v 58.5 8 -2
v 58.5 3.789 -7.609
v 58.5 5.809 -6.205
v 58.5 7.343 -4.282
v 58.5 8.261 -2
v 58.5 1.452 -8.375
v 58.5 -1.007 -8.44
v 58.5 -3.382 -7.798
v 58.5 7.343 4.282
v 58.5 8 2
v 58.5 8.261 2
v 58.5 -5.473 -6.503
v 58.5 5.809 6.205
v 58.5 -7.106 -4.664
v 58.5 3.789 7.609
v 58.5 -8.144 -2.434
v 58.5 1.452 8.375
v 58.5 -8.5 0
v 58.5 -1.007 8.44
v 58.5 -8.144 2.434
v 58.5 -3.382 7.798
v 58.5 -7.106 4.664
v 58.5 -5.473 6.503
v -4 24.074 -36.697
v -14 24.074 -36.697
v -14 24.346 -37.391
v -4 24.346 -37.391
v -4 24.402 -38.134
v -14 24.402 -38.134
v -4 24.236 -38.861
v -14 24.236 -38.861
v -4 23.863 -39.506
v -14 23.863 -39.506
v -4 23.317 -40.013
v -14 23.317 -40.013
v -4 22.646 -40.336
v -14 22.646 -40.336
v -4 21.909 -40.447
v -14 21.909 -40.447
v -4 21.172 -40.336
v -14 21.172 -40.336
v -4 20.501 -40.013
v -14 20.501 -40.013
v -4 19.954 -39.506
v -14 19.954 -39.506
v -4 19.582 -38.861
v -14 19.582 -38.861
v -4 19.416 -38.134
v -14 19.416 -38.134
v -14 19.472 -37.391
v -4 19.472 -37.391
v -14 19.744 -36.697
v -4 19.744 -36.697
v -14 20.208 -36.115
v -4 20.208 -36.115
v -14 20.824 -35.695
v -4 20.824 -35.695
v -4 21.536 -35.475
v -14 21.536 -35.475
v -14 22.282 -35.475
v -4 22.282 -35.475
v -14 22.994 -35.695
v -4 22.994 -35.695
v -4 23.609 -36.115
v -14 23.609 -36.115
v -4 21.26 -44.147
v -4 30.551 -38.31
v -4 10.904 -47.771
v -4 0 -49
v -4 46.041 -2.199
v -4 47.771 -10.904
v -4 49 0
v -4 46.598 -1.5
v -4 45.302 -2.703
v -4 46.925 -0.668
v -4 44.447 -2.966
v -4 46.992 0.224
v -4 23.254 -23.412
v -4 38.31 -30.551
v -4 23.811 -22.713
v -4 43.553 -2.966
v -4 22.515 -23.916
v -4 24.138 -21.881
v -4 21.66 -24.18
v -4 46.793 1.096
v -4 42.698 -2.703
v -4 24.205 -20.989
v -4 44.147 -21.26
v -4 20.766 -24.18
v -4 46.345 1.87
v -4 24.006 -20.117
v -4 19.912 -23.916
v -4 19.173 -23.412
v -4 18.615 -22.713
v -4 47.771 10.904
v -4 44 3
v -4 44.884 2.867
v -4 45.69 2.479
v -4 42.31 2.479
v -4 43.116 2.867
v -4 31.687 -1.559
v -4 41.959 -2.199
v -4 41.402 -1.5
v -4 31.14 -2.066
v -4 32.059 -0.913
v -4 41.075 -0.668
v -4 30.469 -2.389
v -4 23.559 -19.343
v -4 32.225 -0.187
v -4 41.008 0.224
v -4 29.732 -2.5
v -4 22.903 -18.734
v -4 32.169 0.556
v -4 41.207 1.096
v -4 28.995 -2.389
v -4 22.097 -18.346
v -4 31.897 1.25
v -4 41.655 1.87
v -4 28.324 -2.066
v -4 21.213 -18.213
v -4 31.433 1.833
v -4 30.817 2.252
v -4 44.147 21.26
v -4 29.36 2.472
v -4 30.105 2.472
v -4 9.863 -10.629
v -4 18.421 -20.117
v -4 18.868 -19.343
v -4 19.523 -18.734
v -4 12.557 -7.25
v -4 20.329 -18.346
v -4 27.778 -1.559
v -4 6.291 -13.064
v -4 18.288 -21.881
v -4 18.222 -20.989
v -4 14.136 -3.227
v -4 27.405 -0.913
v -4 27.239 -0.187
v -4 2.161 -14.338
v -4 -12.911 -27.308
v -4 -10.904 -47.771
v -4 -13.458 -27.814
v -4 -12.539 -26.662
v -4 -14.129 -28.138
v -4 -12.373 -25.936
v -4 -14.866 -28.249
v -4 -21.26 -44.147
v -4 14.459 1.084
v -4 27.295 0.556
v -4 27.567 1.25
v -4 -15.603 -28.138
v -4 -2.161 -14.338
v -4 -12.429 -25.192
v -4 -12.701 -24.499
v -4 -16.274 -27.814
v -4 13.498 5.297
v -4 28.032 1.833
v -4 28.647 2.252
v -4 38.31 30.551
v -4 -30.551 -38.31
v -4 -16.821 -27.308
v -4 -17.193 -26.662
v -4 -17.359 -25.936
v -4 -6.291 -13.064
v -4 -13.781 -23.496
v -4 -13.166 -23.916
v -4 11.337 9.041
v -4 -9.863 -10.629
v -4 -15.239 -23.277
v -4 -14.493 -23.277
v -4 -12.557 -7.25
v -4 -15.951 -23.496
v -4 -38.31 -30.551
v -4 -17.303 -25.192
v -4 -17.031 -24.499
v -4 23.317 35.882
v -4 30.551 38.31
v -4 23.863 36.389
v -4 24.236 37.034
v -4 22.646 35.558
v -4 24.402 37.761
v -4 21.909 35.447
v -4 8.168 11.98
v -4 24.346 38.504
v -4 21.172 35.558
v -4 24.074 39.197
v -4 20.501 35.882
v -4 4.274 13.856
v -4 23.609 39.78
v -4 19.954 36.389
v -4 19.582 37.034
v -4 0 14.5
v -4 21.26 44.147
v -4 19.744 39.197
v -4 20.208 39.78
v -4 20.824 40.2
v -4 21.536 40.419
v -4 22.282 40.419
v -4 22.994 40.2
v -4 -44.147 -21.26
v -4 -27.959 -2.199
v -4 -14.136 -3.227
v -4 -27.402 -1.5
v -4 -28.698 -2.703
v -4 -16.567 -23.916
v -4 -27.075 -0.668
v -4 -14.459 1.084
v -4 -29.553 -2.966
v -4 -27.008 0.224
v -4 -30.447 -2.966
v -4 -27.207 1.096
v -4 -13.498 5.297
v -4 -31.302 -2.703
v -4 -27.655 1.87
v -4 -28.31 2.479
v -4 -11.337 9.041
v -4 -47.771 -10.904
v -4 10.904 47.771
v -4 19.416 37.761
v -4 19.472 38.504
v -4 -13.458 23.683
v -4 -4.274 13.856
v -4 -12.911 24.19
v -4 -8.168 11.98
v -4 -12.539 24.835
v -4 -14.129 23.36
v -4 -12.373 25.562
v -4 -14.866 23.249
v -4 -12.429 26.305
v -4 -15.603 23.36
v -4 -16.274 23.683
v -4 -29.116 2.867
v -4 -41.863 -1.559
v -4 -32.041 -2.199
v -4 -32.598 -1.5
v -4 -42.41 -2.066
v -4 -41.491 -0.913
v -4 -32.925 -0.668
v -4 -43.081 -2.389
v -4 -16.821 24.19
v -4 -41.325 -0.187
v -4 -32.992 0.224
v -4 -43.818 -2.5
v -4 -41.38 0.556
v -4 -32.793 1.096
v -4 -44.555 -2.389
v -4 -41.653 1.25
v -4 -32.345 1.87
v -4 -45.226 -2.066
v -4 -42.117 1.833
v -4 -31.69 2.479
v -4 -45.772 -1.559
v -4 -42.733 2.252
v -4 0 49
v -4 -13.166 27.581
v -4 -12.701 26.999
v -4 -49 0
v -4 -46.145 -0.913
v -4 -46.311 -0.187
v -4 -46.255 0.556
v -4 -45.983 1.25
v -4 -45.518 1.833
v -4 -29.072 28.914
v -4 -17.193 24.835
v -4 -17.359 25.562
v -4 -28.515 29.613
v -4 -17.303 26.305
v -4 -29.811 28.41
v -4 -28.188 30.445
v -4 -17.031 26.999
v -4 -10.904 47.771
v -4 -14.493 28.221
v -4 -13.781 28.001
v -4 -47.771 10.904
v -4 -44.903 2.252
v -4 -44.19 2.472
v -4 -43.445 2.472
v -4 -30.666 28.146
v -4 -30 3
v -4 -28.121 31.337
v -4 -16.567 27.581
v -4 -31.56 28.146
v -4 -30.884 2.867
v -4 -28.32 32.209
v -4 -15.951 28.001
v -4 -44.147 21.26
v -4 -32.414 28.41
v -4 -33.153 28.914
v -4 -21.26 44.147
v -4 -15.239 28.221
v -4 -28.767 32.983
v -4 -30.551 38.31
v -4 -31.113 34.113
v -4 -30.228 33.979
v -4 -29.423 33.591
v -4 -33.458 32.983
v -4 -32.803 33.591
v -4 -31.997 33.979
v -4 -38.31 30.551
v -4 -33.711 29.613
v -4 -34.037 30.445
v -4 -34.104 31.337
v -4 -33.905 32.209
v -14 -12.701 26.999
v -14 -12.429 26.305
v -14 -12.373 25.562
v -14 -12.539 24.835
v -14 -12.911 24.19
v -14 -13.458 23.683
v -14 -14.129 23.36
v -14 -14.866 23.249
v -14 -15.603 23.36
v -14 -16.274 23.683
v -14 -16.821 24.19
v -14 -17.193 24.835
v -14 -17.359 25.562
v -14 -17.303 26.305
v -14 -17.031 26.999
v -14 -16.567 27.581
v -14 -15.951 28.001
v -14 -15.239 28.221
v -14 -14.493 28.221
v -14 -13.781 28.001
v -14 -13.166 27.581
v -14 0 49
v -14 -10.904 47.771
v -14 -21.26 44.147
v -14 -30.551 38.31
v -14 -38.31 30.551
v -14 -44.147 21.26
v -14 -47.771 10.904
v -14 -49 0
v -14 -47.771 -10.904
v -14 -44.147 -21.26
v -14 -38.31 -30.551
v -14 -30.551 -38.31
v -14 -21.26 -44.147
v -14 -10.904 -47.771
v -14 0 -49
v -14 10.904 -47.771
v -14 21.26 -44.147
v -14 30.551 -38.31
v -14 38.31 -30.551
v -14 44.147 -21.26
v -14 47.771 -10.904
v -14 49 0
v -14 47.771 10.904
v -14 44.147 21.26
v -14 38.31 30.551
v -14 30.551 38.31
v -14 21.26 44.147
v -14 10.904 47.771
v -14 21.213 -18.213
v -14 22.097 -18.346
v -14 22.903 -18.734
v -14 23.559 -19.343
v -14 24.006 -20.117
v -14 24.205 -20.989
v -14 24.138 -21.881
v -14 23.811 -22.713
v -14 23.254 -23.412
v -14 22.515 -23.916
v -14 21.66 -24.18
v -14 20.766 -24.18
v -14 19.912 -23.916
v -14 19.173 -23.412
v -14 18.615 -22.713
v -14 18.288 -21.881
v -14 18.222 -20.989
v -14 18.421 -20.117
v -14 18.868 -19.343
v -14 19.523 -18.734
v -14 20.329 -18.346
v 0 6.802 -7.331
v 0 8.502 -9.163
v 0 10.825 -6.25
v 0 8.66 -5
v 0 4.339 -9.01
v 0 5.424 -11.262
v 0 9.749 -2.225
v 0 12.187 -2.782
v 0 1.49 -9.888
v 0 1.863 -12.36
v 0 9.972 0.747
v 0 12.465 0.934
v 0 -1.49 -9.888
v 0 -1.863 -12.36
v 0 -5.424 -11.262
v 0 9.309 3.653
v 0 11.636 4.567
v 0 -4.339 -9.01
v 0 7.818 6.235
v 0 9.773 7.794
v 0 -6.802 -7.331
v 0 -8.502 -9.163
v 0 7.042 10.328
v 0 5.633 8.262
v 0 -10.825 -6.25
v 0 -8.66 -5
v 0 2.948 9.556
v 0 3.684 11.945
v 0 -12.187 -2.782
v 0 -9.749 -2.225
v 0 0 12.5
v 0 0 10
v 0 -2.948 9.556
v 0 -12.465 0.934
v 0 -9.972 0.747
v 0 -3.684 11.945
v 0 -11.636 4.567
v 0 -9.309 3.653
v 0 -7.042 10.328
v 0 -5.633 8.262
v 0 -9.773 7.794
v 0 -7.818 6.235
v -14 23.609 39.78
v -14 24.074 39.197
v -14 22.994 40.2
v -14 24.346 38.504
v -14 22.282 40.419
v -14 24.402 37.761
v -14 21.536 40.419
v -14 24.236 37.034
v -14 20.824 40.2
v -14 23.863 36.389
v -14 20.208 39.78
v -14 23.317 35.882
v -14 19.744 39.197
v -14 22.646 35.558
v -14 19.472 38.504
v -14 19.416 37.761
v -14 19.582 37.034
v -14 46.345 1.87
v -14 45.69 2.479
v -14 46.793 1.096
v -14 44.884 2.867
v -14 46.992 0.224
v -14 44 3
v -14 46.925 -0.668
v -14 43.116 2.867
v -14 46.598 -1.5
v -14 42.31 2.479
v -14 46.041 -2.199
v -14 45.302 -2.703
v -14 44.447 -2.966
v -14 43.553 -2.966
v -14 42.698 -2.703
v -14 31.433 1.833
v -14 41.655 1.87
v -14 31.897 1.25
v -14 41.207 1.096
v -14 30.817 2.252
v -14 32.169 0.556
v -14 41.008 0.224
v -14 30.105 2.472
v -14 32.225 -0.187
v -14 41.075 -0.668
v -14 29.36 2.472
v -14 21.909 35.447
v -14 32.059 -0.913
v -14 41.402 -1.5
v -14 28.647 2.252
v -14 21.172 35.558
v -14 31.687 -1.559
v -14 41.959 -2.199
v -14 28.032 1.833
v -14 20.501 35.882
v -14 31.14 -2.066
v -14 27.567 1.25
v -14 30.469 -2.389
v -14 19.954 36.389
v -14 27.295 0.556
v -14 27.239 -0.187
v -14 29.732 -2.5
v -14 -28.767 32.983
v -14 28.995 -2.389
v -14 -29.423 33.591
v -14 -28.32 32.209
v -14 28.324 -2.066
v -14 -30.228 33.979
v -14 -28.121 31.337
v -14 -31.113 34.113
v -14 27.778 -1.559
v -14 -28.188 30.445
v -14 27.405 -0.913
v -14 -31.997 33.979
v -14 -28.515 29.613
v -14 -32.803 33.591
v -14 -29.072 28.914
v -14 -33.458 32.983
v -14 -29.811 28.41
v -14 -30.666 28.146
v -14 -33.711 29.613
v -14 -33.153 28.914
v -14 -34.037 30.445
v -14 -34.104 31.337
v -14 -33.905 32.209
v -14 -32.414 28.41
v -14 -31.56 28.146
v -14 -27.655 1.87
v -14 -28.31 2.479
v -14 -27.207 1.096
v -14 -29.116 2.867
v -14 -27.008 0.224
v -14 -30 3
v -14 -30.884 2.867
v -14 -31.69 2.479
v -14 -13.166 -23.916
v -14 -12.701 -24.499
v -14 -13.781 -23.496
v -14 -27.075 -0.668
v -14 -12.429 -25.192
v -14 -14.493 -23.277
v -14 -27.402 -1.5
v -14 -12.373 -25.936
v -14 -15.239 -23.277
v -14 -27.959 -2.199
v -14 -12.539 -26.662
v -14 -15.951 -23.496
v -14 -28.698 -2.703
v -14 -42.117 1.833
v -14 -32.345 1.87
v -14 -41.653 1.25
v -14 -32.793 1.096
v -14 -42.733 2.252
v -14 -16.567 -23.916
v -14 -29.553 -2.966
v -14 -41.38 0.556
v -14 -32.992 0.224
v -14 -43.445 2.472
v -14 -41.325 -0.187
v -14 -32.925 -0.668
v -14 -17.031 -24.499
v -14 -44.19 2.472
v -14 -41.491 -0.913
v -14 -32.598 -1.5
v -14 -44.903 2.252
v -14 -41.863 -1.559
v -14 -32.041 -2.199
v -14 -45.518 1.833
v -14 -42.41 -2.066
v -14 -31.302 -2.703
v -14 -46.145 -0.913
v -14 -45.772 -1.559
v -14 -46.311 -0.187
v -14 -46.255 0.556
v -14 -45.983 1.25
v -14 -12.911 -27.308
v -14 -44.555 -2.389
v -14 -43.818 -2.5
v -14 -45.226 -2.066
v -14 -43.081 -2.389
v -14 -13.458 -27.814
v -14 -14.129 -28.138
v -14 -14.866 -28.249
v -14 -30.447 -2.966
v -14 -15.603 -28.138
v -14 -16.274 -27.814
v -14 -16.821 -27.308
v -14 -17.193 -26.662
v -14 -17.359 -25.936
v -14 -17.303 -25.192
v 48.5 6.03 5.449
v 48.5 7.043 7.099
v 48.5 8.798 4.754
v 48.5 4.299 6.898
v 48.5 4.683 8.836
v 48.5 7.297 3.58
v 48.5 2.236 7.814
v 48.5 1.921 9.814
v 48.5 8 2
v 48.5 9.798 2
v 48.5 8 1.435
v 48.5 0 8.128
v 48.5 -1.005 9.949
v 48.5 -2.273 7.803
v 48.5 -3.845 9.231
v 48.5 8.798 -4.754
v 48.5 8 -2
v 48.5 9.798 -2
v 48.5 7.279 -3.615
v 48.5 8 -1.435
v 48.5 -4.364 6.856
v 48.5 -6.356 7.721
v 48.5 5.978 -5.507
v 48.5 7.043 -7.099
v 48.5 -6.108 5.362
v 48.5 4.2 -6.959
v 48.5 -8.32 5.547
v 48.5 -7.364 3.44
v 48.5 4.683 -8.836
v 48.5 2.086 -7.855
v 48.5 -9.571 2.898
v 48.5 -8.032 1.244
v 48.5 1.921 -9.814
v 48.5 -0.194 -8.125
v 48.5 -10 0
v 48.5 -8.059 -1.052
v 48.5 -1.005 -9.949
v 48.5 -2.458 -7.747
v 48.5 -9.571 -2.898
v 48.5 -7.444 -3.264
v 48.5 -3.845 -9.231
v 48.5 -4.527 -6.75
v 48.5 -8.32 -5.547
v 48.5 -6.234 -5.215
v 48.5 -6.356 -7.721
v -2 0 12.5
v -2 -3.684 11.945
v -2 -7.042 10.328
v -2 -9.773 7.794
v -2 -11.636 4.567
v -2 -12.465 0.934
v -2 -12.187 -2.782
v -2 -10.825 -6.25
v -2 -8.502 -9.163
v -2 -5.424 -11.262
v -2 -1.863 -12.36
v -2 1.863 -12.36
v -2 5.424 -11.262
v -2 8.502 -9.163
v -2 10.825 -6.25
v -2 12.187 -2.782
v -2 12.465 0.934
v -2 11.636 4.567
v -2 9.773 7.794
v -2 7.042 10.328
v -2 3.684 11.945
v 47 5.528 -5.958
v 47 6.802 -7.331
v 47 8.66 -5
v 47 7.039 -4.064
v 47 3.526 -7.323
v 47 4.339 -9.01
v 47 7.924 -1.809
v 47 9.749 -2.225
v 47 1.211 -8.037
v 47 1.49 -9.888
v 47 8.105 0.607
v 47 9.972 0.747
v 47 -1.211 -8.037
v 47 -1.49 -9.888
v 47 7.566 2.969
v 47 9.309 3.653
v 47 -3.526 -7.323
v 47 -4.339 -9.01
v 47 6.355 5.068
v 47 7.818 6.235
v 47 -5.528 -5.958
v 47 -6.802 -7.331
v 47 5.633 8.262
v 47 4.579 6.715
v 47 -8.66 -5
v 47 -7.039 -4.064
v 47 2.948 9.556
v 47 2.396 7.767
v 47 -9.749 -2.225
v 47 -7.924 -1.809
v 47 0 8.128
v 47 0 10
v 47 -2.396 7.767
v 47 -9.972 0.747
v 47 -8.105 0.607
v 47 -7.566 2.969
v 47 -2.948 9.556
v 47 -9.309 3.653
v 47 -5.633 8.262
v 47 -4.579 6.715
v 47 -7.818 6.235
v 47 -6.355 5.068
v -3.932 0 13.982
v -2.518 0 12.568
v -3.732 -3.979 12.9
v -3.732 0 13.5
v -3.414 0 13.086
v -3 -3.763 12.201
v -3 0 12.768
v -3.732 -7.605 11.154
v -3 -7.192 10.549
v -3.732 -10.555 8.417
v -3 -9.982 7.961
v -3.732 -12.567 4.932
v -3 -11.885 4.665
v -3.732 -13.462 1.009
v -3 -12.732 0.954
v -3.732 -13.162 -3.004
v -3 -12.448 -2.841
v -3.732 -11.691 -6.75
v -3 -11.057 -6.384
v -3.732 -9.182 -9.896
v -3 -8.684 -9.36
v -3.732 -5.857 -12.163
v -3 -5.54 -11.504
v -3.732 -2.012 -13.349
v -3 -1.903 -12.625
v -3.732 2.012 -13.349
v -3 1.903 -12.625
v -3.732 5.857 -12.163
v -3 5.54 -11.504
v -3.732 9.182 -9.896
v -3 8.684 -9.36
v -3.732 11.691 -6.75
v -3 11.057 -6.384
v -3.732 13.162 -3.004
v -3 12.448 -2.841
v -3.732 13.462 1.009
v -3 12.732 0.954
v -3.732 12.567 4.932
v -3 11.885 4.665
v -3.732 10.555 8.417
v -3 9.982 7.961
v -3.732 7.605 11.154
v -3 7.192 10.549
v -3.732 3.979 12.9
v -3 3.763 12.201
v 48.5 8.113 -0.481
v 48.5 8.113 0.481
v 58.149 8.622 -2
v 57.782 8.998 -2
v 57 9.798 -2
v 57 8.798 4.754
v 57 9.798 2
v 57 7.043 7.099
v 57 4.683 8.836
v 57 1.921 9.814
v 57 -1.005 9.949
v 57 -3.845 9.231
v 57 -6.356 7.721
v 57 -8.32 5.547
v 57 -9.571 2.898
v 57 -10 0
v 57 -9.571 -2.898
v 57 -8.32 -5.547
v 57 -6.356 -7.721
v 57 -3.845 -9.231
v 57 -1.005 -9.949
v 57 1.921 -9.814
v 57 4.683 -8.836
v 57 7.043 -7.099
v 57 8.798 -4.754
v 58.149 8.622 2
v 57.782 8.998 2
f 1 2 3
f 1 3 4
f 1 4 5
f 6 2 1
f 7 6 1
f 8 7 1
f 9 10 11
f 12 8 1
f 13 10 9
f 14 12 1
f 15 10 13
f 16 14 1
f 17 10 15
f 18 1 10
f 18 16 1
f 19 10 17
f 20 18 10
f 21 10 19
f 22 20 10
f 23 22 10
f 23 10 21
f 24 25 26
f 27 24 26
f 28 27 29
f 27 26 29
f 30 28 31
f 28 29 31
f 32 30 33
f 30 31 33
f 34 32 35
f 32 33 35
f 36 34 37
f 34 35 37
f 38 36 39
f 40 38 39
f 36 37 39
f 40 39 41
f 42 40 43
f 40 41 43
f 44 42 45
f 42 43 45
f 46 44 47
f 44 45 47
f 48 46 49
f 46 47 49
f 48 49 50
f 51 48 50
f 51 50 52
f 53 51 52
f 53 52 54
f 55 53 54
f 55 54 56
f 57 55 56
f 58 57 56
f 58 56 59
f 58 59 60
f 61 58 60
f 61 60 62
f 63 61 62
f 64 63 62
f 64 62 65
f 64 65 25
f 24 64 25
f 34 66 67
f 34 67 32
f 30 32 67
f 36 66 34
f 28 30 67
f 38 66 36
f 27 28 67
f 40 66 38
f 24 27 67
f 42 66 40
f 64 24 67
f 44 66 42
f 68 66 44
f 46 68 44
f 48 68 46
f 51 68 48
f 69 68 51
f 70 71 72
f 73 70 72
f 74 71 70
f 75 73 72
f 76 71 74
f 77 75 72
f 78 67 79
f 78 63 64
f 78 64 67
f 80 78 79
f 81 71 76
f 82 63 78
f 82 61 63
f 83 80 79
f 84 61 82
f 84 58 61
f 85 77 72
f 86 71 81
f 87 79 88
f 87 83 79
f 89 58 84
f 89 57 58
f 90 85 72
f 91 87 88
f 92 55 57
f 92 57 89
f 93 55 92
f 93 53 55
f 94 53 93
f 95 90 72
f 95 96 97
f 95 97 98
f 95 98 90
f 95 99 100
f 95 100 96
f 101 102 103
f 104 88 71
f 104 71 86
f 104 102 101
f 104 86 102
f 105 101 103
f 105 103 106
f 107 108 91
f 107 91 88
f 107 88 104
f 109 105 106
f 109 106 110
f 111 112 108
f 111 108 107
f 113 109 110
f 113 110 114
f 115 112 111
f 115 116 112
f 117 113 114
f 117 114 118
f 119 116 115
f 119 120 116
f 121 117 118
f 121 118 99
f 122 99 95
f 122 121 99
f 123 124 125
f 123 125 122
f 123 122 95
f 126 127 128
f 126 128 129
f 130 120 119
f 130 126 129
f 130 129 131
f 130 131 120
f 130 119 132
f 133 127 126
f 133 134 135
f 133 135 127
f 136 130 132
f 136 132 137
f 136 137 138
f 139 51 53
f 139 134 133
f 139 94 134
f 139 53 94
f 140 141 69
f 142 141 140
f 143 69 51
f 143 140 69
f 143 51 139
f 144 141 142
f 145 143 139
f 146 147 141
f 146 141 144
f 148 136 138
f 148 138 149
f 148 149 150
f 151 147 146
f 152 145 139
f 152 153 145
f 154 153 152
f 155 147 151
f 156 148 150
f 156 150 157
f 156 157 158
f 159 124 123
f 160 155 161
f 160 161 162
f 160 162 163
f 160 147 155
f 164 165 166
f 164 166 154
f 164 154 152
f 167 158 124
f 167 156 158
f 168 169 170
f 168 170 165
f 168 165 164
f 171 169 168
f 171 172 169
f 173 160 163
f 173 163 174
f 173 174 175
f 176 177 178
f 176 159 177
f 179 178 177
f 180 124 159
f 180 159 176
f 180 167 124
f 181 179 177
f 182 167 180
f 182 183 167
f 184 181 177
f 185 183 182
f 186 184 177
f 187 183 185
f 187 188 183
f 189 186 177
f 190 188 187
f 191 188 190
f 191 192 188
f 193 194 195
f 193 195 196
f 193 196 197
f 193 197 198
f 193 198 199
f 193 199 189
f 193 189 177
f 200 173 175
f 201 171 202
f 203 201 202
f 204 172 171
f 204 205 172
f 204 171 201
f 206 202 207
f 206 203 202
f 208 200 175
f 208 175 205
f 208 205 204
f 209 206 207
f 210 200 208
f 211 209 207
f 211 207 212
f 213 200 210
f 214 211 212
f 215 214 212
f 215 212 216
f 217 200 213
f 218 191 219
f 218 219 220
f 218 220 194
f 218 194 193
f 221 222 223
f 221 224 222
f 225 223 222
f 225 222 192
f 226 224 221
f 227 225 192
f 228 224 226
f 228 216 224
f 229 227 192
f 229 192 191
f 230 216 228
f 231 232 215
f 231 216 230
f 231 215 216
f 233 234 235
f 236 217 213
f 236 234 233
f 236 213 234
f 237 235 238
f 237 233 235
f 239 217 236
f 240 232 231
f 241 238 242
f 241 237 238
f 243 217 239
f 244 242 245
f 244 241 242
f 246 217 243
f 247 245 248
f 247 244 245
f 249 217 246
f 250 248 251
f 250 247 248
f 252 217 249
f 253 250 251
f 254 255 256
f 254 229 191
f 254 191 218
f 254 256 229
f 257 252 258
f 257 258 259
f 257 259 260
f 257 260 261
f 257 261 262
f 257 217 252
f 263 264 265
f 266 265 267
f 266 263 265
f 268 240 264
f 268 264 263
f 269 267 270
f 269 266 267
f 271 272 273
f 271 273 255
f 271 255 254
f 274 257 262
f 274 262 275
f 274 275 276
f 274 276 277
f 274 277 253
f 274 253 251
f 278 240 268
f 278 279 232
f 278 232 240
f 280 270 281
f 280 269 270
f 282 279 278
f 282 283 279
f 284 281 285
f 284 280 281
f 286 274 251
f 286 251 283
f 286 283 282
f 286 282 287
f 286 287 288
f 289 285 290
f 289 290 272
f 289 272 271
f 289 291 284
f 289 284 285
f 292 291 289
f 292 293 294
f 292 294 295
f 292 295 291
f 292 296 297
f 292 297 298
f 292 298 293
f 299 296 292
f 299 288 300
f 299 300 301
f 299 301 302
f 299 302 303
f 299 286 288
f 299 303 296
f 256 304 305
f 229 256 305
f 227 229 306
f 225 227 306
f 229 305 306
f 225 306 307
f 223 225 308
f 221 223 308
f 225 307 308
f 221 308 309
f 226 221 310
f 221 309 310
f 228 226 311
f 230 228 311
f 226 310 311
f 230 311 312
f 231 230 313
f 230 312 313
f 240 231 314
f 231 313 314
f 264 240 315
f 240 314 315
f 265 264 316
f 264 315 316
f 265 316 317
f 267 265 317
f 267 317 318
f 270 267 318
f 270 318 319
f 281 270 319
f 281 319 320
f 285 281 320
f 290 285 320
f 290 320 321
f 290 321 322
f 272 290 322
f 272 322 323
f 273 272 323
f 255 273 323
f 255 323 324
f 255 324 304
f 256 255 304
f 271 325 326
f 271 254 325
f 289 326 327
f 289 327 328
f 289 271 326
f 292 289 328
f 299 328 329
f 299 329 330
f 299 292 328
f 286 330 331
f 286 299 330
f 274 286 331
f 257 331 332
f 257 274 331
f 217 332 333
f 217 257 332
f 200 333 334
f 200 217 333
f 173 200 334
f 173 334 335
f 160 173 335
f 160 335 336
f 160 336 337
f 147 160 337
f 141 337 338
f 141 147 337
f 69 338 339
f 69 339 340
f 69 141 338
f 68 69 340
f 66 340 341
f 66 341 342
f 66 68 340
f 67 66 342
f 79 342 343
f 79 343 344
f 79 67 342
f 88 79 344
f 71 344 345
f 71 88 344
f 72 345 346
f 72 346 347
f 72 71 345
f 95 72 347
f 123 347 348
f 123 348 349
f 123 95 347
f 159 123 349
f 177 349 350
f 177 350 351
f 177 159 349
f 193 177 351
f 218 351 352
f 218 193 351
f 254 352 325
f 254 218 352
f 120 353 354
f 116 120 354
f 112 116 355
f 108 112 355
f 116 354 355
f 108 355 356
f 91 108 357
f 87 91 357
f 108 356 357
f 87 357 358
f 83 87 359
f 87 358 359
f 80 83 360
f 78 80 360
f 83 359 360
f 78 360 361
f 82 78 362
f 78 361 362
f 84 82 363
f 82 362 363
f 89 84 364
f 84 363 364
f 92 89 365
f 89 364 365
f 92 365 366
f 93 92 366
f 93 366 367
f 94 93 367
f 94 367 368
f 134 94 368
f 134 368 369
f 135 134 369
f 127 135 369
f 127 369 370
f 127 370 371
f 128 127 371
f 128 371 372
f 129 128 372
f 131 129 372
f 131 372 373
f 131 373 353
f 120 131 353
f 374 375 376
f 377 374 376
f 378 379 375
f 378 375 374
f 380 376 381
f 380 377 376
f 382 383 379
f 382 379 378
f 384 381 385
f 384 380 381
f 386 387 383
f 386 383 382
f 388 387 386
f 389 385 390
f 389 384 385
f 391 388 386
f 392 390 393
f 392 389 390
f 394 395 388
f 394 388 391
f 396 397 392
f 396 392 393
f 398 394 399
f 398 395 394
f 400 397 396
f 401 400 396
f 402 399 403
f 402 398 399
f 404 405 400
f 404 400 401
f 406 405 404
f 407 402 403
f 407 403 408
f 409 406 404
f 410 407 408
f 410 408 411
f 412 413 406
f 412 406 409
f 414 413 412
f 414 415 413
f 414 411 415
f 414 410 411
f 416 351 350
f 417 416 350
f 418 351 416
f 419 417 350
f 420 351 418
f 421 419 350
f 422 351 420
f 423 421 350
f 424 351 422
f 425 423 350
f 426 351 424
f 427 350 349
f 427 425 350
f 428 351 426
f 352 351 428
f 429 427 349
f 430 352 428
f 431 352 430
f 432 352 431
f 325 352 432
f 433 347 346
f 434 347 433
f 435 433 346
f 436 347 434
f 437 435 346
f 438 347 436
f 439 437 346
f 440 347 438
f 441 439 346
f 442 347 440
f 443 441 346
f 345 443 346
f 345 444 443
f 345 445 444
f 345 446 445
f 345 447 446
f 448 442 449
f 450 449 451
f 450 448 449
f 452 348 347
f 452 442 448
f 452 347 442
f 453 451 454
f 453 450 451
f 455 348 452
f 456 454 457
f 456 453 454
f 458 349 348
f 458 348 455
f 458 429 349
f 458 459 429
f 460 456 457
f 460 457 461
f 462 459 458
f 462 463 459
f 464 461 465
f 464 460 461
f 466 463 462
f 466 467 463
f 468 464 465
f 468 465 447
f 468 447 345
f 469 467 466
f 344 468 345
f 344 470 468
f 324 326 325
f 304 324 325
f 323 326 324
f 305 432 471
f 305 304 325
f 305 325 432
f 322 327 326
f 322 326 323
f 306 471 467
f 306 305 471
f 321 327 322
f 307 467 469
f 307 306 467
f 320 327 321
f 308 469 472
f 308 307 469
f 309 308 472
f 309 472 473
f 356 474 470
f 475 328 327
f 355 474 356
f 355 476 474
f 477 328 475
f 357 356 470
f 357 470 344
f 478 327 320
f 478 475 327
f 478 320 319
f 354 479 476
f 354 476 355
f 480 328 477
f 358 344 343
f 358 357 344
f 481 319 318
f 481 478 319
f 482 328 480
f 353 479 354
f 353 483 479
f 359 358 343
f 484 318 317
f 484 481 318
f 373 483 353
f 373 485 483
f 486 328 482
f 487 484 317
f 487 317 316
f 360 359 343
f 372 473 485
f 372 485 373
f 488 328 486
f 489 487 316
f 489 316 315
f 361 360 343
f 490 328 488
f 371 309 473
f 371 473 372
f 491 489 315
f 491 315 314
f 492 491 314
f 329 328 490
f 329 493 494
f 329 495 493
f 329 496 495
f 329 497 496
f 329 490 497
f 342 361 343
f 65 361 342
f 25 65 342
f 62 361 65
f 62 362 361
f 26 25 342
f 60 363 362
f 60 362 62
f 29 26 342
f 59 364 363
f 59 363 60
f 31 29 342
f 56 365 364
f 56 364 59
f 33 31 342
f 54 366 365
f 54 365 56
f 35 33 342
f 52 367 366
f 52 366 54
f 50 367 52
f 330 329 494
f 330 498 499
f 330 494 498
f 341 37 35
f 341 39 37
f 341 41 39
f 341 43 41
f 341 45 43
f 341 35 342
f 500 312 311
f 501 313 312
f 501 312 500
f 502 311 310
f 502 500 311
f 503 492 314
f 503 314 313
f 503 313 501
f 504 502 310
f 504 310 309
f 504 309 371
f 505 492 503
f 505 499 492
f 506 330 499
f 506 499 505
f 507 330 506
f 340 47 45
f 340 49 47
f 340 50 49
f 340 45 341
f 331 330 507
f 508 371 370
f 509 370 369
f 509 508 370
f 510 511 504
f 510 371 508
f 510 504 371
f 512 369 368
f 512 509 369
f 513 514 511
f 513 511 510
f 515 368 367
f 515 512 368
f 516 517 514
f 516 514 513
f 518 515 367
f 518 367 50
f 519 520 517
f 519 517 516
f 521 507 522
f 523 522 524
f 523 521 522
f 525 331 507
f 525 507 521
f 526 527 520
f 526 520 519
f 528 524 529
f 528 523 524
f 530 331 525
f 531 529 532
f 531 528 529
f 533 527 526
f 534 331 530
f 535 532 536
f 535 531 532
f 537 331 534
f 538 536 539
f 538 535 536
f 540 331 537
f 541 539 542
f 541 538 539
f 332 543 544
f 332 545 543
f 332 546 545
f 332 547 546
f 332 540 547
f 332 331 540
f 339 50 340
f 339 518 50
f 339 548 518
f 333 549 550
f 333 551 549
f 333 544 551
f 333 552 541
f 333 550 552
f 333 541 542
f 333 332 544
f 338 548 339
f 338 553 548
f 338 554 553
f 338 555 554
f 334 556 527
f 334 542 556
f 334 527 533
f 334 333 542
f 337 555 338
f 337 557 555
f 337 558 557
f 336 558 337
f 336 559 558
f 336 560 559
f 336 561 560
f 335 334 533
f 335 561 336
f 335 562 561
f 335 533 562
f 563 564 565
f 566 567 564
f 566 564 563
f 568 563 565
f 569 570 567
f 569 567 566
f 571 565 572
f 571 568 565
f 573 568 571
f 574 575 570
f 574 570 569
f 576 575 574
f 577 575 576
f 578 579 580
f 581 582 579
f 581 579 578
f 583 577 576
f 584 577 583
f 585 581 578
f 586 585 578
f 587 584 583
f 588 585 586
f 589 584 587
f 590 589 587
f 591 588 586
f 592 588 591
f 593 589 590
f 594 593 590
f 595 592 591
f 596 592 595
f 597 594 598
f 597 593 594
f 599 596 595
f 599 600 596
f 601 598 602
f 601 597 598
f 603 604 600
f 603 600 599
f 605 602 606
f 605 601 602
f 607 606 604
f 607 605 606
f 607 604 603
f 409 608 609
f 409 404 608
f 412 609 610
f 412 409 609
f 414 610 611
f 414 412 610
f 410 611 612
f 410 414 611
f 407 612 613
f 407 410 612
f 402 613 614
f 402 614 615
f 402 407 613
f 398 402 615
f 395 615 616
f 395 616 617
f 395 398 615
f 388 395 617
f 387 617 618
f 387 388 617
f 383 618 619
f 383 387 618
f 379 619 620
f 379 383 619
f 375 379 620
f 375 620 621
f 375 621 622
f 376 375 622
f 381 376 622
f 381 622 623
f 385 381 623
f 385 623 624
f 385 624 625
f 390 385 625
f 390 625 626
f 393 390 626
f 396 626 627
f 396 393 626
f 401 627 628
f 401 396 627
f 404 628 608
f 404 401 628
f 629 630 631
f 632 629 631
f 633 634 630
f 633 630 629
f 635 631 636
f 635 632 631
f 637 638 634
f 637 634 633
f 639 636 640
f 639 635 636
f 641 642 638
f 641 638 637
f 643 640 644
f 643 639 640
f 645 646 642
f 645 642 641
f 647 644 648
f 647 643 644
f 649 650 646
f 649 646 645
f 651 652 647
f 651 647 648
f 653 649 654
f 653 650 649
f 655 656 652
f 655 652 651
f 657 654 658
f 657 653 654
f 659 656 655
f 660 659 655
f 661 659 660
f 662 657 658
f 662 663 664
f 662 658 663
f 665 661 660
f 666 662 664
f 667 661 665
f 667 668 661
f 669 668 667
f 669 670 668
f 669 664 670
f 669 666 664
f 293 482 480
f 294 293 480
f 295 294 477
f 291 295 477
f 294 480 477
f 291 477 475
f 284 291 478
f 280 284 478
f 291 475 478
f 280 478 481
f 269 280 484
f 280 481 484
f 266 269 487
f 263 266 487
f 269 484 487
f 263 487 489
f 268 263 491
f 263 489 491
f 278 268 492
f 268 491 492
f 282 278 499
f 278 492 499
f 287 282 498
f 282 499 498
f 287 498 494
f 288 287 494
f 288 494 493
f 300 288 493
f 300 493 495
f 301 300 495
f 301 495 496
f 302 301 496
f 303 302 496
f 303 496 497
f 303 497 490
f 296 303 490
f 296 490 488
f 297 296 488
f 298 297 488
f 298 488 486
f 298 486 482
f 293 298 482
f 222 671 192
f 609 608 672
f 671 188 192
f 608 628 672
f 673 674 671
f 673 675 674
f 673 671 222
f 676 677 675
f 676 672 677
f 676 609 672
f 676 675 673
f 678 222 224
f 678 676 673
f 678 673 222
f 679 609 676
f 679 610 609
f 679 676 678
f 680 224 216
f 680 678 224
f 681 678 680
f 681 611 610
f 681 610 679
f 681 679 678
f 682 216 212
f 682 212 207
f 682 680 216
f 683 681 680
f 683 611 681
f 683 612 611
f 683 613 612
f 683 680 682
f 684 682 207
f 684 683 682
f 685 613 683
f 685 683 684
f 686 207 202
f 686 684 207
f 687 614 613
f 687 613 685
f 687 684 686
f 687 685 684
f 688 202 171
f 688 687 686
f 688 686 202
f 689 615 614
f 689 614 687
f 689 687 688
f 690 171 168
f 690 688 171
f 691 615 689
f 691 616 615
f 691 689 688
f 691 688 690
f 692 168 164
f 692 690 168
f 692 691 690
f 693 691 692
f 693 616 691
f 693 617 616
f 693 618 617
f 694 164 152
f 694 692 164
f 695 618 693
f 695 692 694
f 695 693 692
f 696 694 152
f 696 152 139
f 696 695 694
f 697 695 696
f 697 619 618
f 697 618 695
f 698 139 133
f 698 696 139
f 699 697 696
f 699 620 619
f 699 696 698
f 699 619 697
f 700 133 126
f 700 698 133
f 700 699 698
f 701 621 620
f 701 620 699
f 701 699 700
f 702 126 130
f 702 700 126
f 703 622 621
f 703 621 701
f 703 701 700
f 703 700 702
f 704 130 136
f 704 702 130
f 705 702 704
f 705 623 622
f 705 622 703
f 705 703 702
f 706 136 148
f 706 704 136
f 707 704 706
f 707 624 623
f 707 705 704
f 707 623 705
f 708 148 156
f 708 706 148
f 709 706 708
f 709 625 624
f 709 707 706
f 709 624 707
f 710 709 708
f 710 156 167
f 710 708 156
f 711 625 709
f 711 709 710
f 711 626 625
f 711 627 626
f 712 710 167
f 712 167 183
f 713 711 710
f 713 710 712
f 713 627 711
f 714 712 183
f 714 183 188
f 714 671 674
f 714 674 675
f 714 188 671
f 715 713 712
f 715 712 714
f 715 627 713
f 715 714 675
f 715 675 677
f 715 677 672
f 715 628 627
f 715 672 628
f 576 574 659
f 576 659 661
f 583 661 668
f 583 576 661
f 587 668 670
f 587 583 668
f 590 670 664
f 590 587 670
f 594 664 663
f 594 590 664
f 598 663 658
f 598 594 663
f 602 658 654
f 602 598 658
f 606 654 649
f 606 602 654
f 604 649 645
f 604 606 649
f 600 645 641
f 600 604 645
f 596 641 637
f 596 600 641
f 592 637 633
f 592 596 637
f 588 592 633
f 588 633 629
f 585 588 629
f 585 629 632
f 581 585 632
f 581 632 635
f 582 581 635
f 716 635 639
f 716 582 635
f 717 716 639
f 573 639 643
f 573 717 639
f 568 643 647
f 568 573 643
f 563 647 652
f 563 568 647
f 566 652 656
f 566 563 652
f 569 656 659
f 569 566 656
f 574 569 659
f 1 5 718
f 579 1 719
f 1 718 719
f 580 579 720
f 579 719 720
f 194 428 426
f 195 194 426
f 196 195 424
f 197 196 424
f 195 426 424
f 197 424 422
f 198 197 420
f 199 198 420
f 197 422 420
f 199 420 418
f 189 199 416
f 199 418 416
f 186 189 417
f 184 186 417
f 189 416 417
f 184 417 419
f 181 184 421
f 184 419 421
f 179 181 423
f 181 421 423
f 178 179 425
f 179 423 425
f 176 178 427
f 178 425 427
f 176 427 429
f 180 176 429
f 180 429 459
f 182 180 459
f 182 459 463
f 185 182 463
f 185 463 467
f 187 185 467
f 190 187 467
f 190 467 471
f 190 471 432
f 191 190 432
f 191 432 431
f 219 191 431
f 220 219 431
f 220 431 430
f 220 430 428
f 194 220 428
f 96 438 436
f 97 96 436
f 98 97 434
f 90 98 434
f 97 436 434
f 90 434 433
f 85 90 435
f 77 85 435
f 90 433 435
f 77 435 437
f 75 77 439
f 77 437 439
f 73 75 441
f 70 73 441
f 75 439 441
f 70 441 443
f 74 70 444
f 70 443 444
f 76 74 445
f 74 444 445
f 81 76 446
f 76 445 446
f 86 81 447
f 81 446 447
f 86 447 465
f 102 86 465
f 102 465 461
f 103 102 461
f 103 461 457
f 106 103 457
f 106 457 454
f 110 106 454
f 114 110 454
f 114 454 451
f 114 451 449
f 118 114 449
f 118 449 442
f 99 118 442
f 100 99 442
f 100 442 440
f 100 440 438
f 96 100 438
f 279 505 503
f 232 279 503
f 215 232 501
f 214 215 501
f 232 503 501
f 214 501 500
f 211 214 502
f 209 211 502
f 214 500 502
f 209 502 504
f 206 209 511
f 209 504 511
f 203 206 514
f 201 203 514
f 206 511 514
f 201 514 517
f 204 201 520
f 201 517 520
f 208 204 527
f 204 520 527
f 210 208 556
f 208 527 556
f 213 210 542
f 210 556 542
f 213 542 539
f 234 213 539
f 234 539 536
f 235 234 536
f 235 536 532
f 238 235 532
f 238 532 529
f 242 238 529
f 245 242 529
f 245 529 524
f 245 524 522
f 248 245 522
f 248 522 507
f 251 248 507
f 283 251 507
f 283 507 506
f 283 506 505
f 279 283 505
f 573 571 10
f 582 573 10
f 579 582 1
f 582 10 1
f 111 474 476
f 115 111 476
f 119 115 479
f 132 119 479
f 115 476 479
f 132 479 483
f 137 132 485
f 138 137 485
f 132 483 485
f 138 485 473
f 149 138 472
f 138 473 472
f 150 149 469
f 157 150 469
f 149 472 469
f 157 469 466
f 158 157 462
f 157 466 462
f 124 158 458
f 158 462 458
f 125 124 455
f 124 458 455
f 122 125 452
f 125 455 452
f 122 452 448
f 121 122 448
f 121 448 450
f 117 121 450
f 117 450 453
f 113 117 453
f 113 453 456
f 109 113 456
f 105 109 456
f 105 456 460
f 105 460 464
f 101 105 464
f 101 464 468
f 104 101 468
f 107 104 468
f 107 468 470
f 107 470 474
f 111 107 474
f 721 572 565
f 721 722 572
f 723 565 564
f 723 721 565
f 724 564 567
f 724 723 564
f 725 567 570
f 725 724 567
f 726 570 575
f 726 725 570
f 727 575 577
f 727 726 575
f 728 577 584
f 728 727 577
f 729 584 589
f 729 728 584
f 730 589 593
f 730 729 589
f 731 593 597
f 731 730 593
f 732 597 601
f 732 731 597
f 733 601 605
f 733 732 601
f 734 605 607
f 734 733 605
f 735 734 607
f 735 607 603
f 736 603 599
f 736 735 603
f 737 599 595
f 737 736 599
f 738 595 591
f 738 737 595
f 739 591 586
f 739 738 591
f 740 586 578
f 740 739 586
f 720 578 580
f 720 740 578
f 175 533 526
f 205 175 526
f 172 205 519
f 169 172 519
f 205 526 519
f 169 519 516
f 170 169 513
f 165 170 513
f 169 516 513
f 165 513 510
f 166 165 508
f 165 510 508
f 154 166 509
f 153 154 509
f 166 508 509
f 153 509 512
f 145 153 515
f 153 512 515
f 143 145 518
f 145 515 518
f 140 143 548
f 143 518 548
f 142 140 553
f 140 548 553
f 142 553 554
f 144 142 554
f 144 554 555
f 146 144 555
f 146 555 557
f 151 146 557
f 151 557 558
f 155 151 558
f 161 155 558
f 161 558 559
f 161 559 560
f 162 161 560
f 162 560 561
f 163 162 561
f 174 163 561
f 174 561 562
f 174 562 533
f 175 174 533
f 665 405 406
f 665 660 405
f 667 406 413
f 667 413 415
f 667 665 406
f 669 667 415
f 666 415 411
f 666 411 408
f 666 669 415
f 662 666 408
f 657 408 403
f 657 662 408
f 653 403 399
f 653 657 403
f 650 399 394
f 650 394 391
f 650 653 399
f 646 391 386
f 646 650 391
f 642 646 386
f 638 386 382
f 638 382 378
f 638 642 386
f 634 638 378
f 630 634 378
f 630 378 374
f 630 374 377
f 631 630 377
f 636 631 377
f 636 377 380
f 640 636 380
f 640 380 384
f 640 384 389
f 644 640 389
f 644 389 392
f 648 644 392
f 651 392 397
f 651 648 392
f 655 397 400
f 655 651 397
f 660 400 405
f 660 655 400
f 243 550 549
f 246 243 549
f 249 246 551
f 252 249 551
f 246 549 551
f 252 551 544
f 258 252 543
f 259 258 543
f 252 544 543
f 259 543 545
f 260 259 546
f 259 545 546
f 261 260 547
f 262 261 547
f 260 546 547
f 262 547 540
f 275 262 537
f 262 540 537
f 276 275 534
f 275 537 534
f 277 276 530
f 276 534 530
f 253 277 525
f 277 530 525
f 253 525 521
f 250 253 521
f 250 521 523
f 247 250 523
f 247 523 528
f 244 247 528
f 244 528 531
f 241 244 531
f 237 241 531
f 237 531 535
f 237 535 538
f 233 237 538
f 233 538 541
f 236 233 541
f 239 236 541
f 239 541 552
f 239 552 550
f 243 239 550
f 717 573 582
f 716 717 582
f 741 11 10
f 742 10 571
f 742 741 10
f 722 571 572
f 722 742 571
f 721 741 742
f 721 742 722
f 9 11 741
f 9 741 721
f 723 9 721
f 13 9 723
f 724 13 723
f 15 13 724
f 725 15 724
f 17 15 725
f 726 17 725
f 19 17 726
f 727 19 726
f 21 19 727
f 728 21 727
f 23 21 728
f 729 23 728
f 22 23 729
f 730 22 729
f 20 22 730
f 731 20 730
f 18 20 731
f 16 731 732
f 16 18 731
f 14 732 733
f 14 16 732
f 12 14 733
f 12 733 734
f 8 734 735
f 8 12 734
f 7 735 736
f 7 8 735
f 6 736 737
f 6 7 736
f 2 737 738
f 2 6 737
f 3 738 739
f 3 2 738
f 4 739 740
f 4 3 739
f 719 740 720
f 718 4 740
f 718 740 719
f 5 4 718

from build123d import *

# Parameters (mm, degrees)
ENL_V_MAT_EXTRU_1_REACH      = 102.291
ESQUISSE2_R                  = 3
TROU_TARAUD_M61_D            = 5
R_P_TITION_CIRCULAIRE1_COUNT = 3
ENL_V_MAT_EXTRU_4_REACH      = 102.291
ESQUISSE4_W                  = 4
ESQUISSE4_H                  = 4.231945228


with BuildPart() as part:
    # Esquisse1 → Révolution1 (revolve)
    with BuildSketch(Plane.XY, mode=Mode.PRIVATE) as r_volution1_sk:
        with BuildLine():
            Line((-14, 0), (-14, 49))
            Line((-14, 49), (-4, 49))
            Line((-4, 49), (-4, 14.5))
            ThreePointArc((-4, 14.5), (-3.414213562, 13.085786438), (-2, 12.5))
            Line((-2, 12.5), (0, 12.5))
            Line((0, 12.5), (0, 10))
            Line((0, 10), (47, 10))
            Line((47, 10), (47, 8.12772302))
            Line((47, 8.12772302), (48.5, 8.12772302))
            Line((48.5, 8.12772302), (48.5, 10))
            Line((48.5, 10), (57, 10))
            Line((57, 10), (58.5, 8.5))
            Line((58.5, 8.5), (58.5, 0))
            Line((58.5, 0), (-14, 0))
        make_face()
    revolve(r_volution1_sk.sketch.rotate(Axis((-18.286431075, 0, 0), (1, 0, 0)), 90), axis=Axis((-18.286431075, 0, 0), (1, 0, 0)))

    # Esquisse2 → Enlèv. mat.-Extru.1 (cut, up to next)
    with BuildSketch(Plane.ZY.offset(14), mode=Mode.PRIVATE) as enl_v_mat_extru_1_sk1:
        with Locations((0, -30)):
            Circle(ESQUISSE2_R)
    enl_v_mat_extru_1_tool1 = extrude(enl_v_mat_extru_1_sk1.sketch, amount=-ENL_V_MAT_EXTRU_1_REACH, mode=Mode.PRIVATE) & part.part
    # Esquisse2 → Enlèv. mat.-Extru.1 (cut, up to next)
    with BuildSketch(Plane.ZY.offset(14), mode=Mode.PRIVATE) as enl_v_mat_extru_1_sk2:
        with Locations((-21.213203436, 21.213203436)):
            Circle(ESQUISSE2_R)
    enl_v_mat_extru_1_tool2 = extrude(enl_v_mat_extru_1_sk2.sketch, amount=-ENL_V_MAT_EXTRU_1_REACH, mode=Mode.PRIVATE) & part.part
    # Esquisse2 → Enlèv. mat.-Extru.1 (cut, up to next)
    with BuildSketch(Plane.ZY.offset(14), mode=Mode.PRIVATE) as enl_v_mat_extru_1_sk3:
        with Locations((0, 44)):
            Circle(ESQUISSE2_R)
    enl_v_mat_extru_1_tool3 = extrude(enl_v_mat_extru_1_sk3.sketch, amount=-ENL_V_MAT_EXTRU_1_REACH, mode=Mode.PRIVATE) & part.part
    # Esquisse2 → Enlèv. mat.-Extru.1 (cut, up to next)
    with BuildSketch(Plane.ZY.offset(14), mode=Mode.PRIVATE) as enl_v_mat_extru_1_sk4:
        with Locations((31.112698372, -31.112698372)):
            Circle(ESQUISSE2_R)
    enl_v_mat_extru_1_tool4 = extrude(enl_v_mat_extru_1_sk4.sketch, amount=-ENL_V_MAT_EXTRU_1_REACH, mode=Mode.PRIVATE) & part.part
    add(enl_v_mat_extru_1_tool1.solids().sort_by_distance((-14, -30, 0))[0], mode=Mode.SUBTRACT)
    add(enl_v_mat_extru_1_tool2.solids().sort_by_distance((-14, 21.213203, -21.213203))[0], mode=Mode.SUBTRACT)
    add(enl_v_mat_extru_1_tool3.solids().sort_by_distance((-14, 44, 0))[0], mode=Mode.SUBTRACT)
    add(enl_v_mat_extru_1_tool4.solids().sort_by_distance((-14, -31.112698, 31.112698))[0], mode=Mode.SUBTRACT)

    # Trou taraudé M61 (through all)
    with Locations(Plane(origin=(-4, 29.732137495, 0), x_dir=(0, 0, 1), z_dir=(1, 0, 0))):
        with Locations((0, 0), (0, 73.549942095)):
            trou_taraud_m61 = Hole(TROU_TARAUD_M61_D / 2)

    # Répétition circulaire1: Trou taraudé M61 ×3 about axis
    r_p_tition_circulaire1_axis = Axis((0, 0, 0), (1, 0, 0))
    for i in range(1, R_P_TITION_CIRCULAIRE1_COUNT):
        add(trou_taraud_m61.rotate(r_p_tition_circulaire1_axis, i * 360 / R_P_TITION_CIRCULAIRE1_COUNT), mode=Mode.SUBTRACT)

    # Enlèv. mat.-Extru.4: up to this face of the body (flat: up to its plane)
    enl_v_mat_extru_4_end = Plane(part.part.faces().sort_by_distance((48.5, 0, -8.410565733))[0])
    # Esquisse4 → Enlèv. mat.-Extru.4 (cut, up to the picked face)
    with BuildSketch(Plane(origin=(58.5, 0, 0), x_dir=(0, 0, -1), z_dir=(1, 0, 0)), mode=Mode.PRIVATE) as enl_v_mat_extru_4_sk1:
        with Locations((0, 10.115972614)):
            Rectangle(ESQUISSE4_W, ESQUISSE4_H)
    enl_v_mat_extru_4_tool1 = split(extrude(enl_v_mat_extru_4_sk1.sketch, amount=-ENL_V_MAT_EXTRU_4_REACH, mode=Mode.PRIVATE), bisect_by=enl_v_mat_extru_4_end, keep=Keep.BOTH, mode=Mode.PRIVATE)
    add(enl_v_mat_extru_4_tool1.solids().sort_by(Axis((58.5, 10.115973, 0), (-1, 0, 0)))[0], mode=Mode.SUBTRACT)


solid = part.part
